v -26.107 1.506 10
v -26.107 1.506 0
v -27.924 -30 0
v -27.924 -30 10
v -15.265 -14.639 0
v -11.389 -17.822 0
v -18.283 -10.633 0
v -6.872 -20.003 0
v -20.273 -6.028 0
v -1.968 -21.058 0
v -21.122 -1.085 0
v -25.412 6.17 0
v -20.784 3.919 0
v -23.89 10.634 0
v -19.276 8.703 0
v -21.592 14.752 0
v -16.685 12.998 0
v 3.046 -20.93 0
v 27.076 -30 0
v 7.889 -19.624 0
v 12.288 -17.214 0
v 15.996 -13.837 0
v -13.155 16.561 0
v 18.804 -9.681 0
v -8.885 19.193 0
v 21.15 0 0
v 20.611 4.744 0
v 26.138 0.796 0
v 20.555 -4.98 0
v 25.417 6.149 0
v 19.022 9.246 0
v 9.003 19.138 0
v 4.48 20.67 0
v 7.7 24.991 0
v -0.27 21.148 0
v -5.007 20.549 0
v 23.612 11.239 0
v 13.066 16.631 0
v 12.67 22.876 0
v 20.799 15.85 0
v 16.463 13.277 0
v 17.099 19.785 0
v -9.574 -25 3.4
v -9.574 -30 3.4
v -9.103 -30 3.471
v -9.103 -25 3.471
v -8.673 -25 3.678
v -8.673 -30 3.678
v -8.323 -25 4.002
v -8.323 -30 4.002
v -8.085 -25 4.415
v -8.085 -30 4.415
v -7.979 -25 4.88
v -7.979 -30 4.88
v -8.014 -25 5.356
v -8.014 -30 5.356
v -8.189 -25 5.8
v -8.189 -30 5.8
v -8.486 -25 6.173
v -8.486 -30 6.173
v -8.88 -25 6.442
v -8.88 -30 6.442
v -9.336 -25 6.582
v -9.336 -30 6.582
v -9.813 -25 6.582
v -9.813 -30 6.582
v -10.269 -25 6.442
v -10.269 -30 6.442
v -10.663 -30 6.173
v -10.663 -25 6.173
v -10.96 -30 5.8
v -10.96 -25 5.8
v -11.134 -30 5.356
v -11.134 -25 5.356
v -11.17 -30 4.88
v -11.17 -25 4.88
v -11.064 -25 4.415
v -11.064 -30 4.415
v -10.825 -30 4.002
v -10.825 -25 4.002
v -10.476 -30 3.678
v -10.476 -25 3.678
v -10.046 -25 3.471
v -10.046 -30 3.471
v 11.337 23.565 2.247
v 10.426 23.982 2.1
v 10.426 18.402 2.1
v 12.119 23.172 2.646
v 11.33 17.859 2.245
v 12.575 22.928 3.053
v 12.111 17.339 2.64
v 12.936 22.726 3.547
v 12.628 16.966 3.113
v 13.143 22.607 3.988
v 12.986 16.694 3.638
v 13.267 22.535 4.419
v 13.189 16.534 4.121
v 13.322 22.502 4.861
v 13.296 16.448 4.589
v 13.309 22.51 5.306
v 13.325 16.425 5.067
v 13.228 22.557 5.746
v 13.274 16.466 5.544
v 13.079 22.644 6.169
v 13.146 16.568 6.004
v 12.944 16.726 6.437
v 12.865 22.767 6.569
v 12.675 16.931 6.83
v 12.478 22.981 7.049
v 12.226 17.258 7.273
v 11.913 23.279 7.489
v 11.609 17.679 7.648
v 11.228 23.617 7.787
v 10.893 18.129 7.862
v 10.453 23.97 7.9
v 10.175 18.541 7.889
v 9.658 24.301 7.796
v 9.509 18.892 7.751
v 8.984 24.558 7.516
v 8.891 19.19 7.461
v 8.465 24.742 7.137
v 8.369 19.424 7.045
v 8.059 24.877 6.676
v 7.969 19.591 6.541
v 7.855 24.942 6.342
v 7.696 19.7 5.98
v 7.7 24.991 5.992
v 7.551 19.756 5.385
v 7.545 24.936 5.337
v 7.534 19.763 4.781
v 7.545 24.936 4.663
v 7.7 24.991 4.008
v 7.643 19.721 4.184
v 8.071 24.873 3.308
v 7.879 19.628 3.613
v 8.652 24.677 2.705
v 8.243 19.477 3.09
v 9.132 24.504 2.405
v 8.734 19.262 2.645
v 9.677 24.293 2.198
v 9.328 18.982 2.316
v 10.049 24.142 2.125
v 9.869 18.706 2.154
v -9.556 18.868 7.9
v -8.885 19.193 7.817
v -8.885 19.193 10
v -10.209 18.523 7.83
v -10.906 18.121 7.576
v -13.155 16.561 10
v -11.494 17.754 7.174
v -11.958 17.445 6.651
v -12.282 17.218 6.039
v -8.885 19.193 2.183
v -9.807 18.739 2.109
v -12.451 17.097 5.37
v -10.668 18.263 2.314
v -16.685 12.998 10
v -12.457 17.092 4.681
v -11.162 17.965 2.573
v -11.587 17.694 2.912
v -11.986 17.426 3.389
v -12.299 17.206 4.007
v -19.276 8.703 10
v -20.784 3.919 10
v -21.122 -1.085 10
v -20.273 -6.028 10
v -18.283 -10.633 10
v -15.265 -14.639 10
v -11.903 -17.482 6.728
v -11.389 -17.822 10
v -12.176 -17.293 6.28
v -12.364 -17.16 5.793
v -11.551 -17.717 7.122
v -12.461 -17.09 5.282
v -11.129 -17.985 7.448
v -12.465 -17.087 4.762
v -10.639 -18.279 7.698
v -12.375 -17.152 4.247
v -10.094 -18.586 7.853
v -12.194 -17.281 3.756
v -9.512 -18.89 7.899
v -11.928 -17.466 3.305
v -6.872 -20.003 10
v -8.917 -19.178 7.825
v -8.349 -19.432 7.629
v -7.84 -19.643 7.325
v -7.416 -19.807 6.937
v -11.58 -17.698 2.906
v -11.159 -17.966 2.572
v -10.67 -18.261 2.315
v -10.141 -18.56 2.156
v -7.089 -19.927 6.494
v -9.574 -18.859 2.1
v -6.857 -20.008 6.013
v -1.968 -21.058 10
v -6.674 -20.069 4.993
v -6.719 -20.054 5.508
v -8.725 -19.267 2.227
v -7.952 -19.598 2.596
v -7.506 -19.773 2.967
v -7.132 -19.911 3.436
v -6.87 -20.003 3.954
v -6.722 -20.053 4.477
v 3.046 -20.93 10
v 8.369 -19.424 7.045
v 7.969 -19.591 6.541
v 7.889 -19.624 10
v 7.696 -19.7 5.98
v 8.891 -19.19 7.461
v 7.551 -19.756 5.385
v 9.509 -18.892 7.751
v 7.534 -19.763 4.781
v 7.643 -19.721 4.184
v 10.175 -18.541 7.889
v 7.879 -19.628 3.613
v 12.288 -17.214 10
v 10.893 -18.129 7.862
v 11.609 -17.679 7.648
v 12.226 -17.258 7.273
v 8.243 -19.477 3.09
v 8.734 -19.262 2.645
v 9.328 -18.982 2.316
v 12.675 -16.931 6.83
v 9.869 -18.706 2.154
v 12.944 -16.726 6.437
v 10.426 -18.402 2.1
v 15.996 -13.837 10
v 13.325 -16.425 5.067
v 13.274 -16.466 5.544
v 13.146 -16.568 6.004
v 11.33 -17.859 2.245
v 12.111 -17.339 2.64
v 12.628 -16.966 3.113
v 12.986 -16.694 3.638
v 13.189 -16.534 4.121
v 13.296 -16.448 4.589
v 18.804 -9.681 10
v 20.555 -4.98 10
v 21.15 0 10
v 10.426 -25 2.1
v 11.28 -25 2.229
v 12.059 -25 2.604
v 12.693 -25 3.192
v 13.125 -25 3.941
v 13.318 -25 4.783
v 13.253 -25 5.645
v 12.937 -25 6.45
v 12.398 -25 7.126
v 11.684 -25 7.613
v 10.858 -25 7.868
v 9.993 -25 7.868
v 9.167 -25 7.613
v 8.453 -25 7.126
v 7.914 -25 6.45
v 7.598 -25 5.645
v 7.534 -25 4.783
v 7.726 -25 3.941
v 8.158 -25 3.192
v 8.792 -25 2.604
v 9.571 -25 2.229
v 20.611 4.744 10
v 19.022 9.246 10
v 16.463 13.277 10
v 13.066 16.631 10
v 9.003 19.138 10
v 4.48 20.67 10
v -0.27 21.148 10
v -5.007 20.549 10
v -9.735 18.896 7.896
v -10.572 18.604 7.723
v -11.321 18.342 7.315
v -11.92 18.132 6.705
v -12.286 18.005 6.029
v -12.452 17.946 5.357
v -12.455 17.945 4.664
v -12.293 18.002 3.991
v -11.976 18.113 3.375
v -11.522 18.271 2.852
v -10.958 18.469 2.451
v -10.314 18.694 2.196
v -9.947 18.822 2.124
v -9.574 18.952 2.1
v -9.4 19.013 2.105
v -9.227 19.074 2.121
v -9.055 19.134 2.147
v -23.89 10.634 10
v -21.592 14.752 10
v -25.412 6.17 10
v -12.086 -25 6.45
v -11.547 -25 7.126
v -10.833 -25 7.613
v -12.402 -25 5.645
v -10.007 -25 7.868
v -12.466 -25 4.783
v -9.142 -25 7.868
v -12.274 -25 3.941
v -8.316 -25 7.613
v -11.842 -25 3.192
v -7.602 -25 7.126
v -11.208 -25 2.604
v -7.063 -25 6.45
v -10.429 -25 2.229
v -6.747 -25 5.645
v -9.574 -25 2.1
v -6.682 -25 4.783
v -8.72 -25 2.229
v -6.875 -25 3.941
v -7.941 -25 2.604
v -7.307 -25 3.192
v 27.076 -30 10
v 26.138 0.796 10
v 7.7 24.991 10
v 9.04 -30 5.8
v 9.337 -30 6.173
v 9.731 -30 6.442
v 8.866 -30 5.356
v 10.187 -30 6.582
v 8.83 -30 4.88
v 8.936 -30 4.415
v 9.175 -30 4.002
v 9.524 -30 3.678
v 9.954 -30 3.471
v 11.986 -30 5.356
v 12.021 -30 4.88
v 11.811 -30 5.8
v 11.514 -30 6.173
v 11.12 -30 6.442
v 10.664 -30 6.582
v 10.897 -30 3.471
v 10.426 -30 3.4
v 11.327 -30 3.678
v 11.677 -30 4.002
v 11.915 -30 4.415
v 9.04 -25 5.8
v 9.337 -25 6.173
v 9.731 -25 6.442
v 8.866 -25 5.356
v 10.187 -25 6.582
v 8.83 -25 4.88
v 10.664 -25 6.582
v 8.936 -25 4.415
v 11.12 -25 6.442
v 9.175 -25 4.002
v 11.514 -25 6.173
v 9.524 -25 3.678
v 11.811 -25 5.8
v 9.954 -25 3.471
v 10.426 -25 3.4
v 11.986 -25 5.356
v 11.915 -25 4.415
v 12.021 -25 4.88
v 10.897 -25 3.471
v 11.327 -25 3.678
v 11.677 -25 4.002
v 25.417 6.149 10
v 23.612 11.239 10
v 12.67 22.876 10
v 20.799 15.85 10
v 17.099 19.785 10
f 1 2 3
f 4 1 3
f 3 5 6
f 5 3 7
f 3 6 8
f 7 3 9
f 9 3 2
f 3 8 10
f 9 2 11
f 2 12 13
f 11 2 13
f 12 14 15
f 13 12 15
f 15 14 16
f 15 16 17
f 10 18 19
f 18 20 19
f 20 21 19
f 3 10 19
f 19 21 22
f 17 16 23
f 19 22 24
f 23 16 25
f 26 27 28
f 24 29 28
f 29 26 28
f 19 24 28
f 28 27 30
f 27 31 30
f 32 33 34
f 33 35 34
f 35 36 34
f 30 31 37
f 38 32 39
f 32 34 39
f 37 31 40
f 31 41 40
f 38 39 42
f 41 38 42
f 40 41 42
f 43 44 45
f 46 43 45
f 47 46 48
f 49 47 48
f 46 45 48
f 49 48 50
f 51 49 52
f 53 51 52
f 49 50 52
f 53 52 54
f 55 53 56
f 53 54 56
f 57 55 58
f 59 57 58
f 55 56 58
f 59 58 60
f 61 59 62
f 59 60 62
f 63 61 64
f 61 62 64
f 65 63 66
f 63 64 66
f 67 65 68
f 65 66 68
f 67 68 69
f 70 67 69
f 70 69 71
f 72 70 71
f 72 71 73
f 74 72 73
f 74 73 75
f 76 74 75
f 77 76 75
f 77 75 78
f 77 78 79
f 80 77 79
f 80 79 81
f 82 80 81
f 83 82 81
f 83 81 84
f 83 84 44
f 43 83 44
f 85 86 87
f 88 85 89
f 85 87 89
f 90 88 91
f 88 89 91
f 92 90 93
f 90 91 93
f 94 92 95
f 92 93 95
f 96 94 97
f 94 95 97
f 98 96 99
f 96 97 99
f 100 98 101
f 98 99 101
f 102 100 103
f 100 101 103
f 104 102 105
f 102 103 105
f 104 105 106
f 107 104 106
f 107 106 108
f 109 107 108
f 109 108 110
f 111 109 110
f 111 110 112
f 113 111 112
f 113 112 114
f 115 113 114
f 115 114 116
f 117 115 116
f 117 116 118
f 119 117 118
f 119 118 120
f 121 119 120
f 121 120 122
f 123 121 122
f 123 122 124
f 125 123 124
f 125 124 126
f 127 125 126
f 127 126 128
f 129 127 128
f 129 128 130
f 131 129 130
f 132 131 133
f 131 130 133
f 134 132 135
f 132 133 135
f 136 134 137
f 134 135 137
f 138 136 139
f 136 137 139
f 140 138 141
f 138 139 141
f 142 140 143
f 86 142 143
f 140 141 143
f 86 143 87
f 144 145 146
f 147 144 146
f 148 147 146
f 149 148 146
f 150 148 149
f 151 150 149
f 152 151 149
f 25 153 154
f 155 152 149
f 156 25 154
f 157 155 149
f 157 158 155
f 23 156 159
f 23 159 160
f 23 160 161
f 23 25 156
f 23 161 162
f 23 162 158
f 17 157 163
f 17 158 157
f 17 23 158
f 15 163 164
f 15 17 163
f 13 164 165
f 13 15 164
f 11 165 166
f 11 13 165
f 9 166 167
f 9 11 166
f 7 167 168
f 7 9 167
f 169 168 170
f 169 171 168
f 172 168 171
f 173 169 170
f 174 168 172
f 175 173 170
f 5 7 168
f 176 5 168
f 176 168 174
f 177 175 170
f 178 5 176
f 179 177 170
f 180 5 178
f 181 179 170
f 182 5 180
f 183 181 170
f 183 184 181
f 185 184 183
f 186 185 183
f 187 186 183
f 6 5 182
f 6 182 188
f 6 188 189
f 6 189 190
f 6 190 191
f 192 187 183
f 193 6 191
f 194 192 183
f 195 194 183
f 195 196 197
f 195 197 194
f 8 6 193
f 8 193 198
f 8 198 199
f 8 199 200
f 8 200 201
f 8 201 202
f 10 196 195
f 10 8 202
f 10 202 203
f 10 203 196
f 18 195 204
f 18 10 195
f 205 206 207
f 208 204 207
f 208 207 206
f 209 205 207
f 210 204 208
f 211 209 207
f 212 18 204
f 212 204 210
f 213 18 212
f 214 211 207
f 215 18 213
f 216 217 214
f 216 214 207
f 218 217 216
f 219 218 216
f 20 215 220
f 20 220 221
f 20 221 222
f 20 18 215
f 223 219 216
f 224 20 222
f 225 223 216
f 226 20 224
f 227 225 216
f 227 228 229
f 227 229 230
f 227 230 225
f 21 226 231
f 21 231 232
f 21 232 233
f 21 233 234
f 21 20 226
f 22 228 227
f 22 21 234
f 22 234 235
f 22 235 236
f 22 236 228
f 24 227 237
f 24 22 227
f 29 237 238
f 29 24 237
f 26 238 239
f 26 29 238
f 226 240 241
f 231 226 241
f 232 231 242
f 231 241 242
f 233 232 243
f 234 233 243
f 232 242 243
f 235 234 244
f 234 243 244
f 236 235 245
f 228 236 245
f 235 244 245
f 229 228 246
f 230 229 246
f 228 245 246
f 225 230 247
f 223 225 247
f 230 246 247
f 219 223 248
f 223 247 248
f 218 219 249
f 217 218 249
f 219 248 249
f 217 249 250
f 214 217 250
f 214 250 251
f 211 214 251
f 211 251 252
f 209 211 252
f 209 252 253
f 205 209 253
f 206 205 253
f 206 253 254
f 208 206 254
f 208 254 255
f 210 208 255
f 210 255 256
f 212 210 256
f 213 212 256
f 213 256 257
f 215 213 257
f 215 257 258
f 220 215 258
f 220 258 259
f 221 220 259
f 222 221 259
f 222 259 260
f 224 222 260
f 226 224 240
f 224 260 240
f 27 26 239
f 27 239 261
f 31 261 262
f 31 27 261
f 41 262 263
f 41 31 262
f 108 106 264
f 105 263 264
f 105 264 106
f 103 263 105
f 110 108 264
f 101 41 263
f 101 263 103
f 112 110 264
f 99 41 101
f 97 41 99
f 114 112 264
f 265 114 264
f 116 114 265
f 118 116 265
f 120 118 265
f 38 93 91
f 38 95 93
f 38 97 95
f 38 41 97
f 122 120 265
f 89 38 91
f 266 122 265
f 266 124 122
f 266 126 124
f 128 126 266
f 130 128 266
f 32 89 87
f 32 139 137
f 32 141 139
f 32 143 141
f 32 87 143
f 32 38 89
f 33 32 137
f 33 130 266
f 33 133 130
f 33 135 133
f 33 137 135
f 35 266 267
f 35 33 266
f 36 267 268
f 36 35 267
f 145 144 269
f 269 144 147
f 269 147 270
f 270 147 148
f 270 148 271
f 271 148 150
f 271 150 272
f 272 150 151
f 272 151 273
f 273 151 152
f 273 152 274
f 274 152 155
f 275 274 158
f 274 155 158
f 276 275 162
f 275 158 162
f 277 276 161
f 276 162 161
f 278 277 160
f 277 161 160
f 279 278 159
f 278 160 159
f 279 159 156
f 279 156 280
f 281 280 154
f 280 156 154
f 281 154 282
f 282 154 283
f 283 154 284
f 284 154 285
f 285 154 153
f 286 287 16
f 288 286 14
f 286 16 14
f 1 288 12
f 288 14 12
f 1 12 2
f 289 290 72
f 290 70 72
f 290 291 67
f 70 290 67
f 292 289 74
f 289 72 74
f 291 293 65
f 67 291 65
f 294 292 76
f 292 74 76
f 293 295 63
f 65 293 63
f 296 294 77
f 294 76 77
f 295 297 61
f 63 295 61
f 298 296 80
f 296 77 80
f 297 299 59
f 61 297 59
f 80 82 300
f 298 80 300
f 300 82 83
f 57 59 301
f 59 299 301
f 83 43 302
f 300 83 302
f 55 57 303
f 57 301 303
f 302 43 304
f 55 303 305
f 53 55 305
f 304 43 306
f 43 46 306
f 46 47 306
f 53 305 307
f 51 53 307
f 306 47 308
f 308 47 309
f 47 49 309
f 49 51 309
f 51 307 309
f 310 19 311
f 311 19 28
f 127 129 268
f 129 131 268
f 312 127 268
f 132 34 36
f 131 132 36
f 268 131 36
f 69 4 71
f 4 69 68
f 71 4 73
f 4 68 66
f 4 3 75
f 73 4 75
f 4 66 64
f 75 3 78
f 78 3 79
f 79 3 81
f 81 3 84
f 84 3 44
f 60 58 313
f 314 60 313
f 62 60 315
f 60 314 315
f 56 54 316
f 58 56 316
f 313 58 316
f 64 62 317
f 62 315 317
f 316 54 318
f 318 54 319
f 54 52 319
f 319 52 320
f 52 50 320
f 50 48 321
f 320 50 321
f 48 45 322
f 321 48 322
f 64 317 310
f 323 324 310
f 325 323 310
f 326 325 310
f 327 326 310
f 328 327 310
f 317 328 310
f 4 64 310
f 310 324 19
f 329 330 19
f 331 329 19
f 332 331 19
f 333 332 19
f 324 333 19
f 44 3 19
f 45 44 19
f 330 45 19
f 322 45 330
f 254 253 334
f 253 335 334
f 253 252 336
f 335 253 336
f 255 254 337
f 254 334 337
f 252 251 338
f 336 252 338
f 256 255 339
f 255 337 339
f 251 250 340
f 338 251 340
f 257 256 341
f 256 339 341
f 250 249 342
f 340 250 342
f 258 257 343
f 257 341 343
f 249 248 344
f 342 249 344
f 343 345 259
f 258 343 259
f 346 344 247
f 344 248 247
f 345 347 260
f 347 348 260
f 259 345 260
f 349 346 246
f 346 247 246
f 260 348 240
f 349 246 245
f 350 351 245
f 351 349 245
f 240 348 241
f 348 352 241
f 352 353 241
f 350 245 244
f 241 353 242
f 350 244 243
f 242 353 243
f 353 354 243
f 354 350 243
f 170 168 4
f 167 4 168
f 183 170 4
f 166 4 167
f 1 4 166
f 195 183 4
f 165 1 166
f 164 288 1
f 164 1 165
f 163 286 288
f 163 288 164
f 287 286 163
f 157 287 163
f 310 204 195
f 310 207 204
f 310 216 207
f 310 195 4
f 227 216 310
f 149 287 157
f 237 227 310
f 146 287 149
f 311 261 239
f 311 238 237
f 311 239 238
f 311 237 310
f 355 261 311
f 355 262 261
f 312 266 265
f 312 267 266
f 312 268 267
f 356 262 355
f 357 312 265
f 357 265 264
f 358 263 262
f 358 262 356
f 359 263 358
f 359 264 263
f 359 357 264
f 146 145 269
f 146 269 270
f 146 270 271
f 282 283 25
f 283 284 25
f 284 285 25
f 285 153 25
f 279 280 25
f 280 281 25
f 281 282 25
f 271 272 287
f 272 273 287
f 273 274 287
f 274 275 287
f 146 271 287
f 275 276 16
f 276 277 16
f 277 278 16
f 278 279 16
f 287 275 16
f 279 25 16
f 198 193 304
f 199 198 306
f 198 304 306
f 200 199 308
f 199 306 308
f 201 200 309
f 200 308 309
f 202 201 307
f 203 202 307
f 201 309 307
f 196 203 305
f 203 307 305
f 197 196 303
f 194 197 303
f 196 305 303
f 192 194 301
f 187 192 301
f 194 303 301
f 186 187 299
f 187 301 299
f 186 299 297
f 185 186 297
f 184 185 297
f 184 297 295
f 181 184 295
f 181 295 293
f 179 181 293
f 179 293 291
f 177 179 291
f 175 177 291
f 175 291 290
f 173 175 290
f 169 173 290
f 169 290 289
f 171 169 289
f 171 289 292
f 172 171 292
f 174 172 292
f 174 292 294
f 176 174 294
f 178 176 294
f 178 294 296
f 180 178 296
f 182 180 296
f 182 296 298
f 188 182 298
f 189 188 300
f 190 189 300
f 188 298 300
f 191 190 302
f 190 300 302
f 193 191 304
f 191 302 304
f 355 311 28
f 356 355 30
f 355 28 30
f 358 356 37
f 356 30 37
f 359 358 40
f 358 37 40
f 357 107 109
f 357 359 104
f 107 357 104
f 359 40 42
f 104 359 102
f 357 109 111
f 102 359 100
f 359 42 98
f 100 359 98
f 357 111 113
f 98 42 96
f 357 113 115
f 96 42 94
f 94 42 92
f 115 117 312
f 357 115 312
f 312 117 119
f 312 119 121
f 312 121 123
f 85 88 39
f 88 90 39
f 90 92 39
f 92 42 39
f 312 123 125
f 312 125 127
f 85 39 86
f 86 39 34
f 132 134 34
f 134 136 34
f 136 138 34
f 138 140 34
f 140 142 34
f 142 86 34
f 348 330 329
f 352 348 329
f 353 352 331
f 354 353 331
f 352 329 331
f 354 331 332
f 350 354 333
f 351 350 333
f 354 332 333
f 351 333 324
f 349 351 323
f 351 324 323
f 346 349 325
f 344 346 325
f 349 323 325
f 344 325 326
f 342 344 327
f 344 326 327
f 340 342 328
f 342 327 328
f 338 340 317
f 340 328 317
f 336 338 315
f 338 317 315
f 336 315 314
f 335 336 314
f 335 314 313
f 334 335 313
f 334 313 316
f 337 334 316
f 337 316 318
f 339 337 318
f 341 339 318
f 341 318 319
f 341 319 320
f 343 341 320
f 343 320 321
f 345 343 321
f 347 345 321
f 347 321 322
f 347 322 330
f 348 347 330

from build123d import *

# Parameters (mm, degrees)
SKETCH_1_R          = 21.15
EXTRUDE_1_DEPTH     = 10
SKETCH_2_R          = 1.6
CUT_EXTRUDE_1_DEPTH = 64.50267784
CUT_EXTRUDE_START   = -5
SKETCH_3_R          = 2.9
CUT_EXTRUDE_2_DEPTH = 59.502677944
CUT_EXTRUDE_5_DEPTH = 43.187291864


with BuildPart() as part:
    # 草图1 → 凸台-拉伸1 (new body)
    with BuildSketch(Plane.XY):
        with BuildLine():
            Line((-27.924319022, -30), (27.075680978, -30))
            Line((27.075680978, -30), (26.137883686, 0.795950004))
            ThreePointArc((26.137883686, 0.795950004), (0.355472008, 26.147583821), (-26.106586279, 1.506204794))
            Line((-26.106586279, 1.506204794), (-27.924319022, -30))
        make_face()
        Circle(SKETCH_1_R, mode=Mode.SUBTRACT)
    extrude(amount=EXTRUDE_1_DEPTH)

    # 草图2 → 切除-拉伸1 (cut, through all)
    with BuildSketch(Plane.XZ.offset(30)):
        with Locations(Location((10.425680978, 5, 0), (0, 0, 270))):
            Circle(SKETCH_2_R)
        with Locations(Location((-9.574319022, 5, 0), (0, 0, 270))):
            Circle(SKETCH_2_R)
    extrude(amount=-CUT_EXTRUDE_1_DEPTH, mode=Mode.SUBTRACT)

    # 草图3 → 切除-拉伸2 (cut, through all)
    with BuildSketch(Plane.XZ.offset(30).offset(CUT_EXTRUDE_START)):
        with Locations(Location((10.425680978, 5, 0), (0, 0, 270))):
            Circle(SKETCH_3_R)
        with Locations(Location((-9.574319022, 5, 0), (0, 0, 270))):
            Circle(SKETCH_3_R)
    extrude(amount=-CUT_EXTRUDE_2_DEPTH, mode=Mode.SUBTRACT)

    # 草图4 → 切除-拉伸5 (cut, through all)
    with BuildSketch(Plane(origin=(0, 0, 0), x_dir=(-1, 0, 0), z_dir=(0, 0, -1))):
        with BuildLine():
            Line((-7.858993685, 25.04593217), (21.750509975, 14.696183717))
            ThreePointArc((21.750509975, 14.696183717), (8.661574884, 24.779822851), (-7.858993685, 25.04593217))
        make_face()
    extrude(amount=-CUT_EXTRUDE_5_DEPTH, mode=Mode.SUBTRACT)


solid = part.part
